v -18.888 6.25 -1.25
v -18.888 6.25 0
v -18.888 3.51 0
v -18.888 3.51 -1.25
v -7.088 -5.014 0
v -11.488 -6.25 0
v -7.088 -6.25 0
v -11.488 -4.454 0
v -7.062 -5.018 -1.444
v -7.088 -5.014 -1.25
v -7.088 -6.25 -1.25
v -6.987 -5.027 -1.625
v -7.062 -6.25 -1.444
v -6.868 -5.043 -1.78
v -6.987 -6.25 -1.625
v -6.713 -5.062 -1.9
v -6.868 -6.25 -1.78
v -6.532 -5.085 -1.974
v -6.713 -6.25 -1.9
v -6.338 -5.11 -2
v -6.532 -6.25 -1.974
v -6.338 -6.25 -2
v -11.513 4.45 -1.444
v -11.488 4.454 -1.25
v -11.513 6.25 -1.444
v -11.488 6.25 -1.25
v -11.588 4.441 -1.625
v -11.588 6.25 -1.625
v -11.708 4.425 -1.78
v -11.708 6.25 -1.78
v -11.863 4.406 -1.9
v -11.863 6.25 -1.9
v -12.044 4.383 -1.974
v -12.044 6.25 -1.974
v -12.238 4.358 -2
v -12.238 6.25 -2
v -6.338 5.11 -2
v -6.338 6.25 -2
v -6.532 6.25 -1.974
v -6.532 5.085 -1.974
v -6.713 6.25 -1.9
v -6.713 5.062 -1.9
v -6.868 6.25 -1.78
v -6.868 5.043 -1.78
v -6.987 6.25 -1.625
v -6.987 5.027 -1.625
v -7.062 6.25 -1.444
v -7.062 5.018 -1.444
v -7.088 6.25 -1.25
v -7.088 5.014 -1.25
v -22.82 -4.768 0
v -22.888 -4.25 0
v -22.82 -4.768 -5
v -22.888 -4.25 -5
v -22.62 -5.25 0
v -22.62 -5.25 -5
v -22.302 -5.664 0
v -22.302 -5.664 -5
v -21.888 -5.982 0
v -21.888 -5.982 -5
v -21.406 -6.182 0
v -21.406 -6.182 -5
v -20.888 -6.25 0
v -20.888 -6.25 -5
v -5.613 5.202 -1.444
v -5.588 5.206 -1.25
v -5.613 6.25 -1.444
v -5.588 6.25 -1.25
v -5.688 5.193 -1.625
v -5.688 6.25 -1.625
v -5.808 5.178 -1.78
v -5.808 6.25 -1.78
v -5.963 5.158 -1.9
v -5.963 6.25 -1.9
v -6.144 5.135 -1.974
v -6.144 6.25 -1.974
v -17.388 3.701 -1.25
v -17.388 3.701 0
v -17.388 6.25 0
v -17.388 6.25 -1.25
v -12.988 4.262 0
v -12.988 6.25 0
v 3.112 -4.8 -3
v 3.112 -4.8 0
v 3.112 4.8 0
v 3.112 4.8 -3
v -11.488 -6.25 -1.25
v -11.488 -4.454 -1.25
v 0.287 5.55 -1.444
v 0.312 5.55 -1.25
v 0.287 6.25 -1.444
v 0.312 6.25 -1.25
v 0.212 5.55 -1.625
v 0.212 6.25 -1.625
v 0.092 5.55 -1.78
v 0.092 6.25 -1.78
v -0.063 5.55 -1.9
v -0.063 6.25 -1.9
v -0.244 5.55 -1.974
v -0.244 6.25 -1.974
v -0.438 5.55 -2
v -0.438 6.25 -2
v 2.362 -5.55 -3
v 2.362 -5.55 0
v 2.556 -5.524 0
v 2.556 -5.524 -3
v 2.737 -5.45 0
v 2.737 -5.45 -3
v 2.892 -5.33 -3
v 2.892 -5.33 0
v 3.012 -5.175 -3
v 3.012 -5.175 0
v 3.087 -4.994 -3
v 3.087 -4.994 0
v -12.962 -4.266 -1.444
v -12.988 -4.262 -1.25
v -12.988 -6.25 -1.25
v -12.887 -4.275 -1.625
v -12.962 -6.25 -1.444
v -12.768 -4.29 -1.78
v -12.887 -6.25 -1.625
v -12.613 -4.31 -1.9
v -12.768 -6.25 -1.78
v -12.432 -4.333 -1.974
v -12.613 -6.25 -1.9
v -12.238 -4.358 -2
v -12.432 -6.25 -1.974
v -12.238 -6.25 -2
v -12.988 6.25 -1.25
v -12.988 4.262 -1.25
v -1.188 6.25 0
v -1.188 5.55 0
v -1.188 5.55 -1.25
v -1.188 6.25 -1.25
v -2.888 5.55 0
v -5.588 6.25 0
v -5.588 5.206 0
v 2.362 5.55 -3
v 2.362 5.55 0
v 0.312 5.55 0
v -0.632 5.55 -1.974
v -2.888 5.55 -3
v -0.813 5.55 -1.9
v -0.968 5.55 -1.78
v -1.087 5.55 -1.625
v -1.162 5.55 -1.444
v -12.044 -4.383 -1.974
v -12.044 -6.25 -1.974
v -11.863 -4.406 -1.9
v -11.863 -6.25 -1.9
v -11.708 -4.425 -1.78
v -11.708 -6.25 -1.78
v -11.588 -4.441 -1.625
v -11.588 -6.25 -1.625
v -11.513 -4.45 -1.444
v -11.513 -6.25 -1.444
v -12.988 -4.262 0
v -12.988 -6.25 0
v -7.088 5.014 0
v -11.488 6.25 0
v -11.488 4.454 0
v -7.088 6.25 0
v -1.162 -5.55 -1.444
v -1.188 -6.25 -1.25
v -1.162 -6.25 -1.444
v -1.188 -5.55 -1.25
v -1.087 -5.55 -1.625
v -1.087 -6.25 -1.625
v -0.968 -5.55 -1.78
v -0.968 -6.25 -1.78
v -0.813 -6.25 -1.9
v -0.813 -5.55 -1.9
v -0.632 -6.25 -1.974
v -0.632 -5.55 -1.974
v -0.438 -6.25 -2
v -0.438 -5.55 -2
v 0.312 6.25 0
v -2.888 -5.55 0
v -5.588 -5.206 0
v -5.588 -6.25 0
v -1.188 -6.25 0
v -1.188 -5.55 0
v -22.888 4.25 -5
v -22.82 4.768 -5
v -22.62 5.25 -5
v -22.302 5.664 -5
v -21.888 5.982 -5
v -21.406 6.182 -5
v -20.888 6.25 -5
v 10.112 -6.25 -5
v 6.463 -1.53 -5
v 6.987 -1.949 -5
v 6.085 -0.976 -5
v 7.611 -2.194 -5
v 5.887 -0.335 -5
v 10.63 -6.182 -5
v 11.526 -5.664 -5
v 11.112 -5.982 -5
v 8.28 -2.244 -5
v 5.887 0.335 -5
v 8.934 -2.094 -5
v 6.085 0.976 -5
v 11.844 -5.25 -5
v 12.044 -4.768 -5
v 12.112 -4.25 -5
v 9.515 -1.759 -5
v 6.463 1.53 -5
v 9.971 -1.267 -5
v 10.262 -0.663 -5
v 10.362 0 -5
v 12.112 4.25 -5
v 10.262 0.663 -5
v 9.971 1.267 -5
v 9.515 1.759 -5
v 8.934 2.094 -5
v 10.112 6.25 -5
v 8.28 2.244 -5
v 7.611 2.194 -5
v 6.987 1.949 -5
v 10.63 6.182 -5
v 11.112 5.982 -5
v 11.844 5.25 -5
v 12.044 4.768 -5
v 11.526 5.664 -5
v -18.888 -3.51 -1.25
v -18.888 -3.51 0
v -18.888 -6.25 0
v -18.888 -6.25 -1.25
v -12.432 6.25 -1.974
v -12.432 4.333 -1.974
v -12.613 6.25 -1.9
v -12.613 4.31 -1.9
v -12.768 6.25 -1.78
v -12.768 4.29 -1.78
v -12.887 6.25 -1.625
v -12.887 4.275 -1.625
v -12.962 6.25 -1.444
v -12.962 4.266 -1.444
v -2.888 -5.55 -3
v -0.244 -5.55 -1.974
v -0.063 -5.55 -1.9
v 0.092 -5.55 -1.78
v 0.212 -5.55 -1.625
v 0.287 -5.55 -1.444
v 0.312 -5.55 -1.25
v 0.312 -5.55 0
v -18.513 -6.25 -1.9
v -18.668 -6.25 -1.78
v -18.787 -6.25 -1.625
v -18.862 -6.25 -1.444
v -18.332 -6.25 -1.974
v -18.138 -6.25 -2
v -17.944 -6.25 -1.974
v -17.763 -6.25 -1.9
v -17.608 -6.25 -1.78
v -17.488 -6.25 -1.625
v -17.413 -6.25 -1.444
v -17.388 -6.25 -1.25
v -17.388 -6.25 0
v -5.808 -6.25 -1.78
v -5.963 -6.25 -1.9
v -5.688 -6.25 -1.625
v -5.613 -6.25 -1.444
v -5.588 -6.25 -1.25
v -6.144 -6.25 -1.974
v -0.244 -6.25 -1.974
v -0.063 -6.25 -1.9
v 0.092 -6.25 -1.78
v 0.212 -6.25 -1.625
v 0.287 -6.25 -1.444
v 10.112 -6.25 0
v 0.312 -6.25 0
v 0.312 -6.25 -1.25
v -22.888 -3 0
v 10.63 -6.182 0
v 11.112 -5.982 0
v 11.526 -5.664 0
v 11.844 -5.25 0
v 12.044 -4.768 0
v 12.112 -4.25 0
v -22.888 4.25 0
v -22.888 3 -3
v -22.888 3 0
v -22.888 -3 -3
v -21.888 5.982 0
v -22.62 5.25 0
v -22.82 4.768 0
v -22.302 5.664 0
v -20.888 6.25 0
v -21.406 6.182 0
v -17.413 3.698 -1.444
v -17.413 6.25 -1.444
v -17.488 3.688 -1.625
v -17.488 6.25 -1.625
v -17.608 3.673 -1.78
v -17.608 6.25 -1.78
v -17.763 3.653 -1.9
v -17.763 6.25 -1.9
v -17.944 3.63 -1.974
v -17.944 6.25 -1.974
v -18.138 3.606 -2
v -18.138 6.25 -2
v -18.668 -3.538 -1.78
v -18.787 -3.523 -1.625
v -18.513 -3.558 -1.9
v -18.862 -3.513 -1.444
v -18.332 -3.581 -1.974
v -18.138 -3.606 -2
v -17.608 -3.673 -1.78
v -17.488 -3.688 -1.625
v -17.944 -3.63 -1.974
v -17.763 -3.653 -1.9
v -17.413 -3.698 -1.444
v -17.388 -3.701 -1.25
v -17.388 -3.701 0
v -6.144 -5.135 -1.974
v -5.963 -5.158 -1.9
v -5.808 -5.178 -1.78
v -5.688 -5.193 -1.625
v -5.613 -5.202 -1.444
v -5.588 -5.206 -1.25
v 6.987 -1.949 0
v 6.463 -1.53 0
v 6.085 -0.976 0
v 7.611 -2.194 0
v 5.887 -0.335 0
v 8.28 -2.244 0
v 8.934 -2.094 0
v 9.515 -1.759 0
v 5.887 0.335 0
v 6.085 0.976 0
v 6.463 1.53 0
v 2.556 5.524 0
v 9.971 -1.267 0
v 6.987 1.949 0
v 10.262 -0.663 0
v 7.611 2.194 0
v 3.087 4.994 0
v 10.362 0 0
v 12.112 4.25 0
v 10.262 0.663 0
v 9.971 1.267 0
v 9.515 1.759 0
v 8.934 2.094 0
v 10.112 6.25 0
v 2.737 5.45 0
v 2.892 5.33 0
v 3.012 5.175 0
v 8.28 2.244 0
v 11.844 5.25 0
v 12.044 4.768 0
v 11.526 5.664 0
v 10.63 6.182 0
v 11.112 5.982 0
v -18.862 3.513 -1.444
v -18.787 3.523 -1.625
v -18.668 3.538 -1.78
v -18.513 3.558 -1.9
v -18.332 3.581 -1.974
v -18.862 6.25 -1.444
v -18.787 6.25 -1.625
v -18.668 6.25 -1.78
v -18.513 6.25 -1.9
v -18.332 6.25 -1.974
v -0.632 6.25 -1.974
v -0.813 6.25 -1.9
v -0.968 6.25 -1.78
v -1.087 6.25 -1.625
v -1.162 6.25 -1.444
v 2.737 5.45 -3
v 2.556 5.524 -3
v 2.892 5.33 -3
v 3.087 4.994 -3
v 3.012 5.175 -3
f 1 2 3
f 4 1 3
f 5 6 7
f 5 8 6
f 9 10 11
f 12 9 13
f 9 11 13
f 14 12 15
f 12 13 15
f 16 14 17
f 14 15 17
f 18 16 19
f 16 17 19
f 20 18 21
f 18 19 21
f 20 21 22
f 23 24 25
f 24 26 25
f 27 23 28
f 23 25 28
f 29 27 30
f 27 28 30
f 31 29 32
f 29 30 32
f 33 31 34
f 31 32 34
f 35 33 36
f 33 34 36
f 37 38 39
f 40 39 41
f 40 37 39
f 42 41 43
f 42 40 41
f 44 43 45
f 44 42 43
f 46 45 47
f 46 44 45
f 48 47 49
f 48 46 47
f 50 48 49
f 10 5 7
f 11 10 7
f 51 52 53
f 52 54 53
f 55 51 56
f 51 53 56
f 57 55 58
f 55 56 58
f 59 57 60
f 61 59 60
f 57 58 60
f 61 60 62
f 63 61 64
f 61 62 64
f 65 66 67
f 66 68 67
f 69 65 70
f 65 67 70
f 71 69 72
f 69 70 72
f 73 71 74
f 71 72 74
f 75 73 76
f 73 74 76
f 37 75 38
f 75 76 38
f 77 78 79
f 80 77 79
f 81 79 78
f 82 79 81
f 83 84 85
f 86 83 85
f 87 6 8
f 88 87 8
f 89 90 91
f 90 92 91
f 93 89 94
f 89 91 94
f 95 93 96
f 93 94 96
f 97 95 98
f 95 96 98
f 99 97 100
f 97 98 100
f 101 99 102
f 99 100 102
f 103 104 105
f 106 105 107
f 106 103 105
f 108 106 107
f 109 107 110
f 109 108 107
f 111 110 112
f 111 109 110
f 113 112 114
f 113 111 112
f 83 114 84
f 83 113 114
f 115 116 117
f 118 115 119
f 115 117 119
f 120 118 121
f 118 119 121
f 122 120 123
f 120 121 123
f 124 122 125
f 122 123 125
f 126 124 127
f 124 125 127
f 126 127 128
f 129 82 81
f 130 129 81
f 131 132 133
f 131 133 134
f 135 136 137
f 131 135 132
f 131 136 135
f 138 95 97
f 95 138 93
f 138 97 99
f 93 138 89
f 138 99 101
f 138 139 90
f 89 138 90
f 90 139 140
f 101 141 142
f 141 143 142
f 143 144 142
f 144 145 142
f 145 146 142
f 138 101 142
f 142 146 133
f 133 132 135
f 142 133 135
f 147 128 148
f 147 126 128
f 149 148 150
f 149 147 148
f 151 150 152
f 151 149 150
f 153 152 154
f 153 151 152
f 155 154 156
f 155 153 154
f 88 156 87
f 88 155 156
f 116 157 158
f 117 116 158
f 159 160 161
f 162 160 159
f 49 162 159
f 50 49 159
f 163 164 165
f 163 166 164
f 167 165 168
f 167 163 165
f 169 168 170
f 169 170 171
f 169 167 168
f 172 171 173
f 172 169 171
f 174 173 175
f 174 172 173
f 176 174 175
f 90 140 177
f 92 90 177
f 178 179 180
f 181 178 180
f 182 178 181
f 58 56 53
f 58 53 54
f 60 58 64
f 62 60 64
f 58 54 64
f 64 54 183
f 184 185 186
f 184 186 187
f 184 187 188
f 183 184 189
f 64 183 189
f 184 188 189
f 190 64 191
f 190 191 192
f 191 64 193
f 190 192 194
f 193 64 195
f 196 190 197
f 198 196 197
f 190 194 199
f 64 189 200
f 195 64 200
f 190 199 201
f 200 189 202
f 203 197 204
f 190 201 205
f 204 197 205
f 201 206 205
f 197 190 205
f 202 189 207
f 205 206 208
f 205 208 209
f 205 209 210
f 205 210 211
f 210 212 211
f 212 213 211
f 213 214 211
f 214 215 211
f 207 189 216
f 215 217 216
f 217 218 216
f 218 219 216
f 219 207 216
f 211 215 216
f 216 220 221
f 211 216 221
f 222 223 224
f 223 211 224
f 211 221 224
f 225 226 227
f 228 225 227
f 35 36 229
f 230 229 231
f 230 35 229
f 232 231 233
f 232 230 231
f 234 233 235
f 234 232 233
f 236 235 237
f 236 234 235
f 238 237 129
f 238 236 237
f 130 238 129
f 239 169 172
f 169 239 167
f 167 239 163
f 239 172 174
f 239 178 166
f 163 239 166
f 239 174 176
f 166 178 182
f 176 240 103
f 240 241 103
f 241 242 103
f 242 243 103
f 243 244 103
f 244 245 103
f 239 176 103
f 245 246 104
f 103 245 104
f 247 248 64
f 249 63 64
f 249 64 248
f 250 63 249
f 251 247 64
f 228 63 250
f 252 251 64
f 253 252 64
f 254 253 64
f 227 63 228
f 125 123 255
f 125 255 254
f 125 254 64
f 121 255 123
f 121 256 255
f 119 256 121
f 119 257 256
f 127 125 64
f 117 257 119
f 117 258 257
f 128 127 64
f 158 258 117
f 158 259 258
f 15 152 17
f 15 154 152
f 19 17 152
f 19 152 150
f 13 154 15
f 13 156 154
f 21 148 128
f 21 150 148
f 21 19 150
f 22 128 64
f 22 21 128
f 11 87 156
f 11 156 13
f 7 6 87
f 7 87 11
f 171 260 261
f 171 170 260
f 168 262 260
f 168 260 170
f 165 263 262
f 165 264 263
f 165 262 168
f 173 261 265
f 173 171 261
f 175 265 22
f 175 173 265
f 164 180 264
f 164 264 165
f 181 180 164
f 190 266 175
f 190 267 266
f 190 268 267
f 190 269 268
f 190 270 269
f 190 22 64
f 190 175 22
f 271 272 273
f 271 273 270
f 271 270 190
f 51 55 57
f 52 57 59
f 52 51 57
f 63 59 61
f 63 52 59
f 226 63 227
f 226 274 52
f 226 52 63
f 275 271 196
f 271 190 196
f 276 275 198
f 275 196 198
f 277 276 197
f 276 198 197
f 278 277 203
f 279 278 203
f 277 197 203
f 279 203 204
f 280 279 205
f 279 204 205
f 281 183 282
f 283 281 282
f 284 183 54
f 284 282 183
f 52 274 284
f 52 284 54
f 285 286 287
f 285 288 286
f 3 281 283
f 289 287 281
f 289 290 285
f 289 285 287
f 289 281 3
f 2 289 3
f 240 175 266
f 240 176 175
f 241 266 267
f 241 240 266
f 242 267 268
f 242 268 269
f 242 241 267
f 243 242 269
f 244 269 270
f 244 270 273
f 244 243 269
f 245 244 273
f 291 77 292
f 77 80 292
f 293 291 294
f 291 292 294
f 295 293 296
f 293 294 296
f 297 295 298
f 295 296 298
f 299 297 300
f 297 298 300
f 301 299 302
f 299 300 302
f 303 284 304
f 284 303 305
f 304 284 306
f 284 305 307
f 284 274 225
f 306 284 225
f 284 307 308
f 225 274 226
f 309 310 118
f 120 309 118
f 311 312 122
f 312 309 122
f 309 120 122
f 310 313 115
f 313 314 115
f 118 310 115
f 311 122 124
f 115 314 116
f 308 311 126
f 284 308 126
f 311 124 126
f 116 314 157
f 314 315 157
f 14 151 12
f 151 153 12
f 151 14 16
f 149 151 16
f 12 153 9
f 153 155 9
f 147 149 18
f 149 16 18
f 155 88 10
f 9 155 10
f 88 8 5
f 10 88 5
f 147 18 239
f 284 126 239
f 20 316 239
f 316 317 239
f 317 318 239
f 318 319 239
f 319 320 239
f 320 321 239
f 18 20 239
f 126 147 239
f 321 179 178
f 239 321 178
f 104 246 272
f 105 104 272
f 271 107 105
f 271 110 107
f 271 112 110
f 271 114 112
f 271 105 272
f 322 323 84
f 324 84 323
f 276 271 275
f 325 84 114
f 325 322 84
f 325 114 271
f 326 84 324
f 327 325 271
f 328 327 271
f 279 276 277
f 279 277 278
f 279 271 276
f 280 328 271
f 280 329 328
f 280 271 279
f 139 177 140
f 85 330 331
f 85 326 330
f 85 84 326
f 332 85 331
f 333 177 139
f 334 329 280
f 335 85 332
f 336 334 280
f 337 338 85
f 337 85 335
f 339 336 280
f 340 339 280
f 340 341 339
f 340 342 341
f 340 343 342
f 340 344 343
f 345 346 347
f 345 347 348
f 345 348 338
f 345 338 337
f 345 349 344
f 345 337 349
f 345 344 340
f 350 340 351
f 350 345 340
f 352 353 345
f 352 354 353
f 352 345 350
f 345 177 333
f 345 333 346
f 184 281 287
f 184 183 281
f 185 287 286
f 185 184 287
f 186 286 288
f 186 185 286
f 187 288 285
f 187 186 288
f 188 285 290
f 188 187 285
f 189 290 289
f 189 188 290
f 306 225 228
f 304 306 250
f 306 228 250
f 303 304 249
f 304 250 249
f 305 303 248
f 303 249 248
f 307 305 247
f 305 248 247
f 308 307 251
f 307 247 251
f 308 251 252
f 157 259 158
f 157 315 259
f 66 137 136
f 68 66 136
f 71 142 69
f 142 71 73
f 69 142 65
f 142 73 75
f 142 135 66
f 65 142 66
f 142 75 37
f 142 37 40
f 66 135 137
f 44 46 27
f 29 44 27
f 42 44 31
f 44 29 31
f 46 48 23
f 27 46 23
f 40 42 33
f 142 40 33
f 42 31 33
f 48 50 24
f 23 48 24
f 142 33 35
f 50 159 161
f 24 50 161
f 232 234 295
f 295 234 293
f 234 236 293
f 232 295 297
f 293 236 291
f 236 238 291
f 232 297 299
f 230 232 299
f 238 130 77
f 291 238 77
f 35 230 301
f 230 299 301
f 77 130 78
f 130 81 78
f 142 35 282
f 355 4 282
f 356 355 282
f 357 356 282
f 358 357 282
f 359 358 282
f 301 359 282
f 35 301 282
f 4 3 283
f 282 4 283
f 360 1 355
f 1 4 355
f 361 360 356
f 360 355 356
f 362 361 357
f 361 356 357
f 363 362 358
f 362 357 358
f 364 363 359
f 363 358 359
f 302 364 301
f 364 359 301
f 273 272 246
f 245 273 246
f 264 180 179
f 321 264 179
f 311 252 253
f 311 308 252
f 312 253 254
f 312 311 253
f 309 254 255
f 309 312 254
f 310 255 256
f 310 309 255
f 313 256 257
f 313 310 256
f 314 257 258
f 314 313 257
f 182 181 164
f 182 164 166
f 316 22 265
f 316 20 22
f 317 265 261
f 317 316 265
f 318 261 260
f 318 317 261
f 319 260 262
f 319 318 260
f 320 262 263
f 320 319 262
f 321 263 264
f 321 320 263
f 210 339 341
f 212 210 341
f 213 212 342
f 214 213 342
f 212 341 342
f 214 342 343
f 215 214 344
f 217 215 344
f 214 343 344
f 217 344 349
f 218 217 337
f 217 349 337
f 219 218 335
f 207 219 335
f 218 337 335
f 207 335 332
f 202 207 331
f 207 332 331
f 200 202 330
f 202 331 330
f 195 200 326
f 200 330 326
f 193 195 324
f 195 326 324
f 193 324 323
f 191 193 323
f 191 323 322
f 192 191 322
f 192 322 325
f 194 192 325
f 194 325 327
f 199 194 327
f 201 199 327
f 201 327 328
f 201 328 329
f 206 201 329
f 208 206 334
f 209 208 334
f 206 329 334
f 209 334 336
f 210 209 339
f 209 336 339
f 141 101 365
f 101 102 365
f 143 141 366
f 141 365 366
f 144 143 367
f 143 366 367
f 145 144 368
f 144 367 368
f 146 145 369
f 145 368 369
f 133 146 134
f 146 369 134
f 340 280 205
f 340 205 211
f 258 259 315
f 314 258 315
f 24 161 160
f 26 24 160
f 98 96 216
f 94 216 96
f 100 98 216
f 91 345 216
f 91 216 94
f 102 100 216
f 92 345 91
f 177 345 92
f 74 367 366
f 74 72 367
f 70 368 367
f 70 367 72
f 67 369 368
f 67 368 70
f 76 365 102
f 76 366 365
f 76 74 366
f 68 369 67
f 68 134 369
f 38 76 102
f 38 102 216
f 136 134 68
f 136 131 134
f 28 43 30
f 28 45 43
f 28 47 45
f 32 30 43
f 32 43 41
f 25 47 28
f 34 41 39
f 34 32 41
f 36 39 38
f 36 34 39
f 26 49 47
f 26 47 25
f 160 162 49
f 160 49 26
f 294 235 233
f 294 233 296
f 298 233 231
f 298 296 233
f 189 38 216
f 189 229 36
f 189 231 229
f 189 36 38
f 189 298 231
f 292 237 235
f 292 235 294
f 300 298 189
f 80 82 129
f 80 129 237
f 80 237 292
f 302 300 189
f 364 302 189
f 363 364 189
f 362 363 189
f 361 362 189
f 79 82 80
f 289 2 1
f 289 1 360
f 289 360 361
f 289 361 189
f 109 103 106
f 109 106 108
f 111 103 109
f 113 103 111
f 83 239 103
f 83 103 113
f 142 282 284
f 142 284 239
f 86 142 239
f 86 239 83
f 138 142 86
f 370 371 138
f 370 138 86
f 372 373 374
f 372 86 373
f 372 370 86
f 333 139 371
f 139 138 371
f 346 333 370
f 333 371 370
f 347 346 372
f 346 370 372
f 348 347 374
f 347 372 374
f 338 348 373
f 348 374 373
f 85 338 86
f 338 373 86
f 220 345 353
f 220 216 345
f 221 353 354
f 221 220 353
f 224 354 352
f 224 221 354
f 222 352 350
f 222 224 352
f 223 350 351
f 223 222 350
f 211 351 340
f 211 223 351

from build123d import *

# Parameters (mm, degrees)
F0_W     = 1.5
F0_H     = 0.7
F0_R     = 2.25
F0_H_2   = 11.1
F0_W_2   = 2.8
F1_DEPTH = 5
F2_DEPTH = 3
F3_DEPTH = 2
F4_R     = 0.74999
F5_R     = 2


# Not quite as in the source:
# - a fillet or chamfer is up to 0.001 mm smaller than in the source, because OpenCascade refuses the exact size


with BuildPart() as f1:
    # F0 (on Top) → F1 (new body)
    with BuildSketch(Plane.XY):
        Polygon((-18.8879279066, 6.25), (-22.8879279066, 6.25), (-22.8879279066, 3), (-18.8879279066, 3.51), align=None)
        Polygon((-17.3879279066, 6.25), (-18.8879279066, 6.25), (-18.8879279066, 3.51), (-17.3879279066, 3.70125), align=None)
        Polygon((-18.8879279066, 3.51), (-22.8879279066, 3), (-22.8879279066, -3), (-18.8879279066, -3.51), align=None)
        Polygon((-12.9879279066, 6.25), (-17.3879279066, 6.25), (-17.3879279066, 3.70125), (-12.9879279066, 4.26225), align=None)
        Polygon((-18.8879279066, -3.51), (-22.8879279066, -3), (-22.8879279066, -6.25), (-18.8879279066, -6.25), align=None)
        Polygon((-11.4879279066, 6.25), (-12.9879279066, 6.25), (-12.9879279066, 4.26225), (-11.4879279066, 4.4535), align=None)
        Polygon((-17.3879279066, -3.70125), (-18.8879279066, -3.51), (-18.8879279066, -6.25), (-17.3879279066, -6.25), align=None)
        Polygon((-7.0879279066, 6.25), (-11.4879279066, 6.25), (-11.4879279066, 4.4535), (-7.0879279066, 5.0145), align=None)
        Polygon((-12.9879279066, -4.26225), (-17.3879279066, -3.70125), (-17.3879279066, -6.25), (-12.9879279066, -6.25), align=None)
        Polygon((-5.5879279066, 6.25), (-7.0879279066, 6.25), (-7.0879279066, 5.0145), (-5.5879279066, 5.20575), align=None)
        Polygon((-11.4879279066, -4.4535), (-12.9879279066, -4.26225), (-12.9879279066, -6.25), (-11.4879279066, -6.25), align=None)
        Polygon((-1.1879279066, 6.25), (-5.5879279066, 6.25), (-5.5879279066, 5.20575), (-2.8879279066, 5.55), (-1.1879279066, 5.55), align=None)
        Polygon((-7.0879279066, -5.0145), (-11.4879279066, -4.4535), (-11.4879279066, -6.25), (-7.0879279066, -6.25), align=None)
        with Locations((-0.4379279066, 5.9)):
            Rectangle(F0_W, F0_H)
        Polygon((-5.5879279066, -5.20575), (-7.0879279066, -5.0145), (-7.0879279066, -6.25), (-5.5879279066, -6.25), align=None)
        Polygon((12.1120720934, 6.25), (0.3120720934, 6.25), (0.3120720934, 5.55), (3.1120720934, 5.55), (3.1120720934, -5.55), (0.3120720934, -5.55), (0.3120720934, -6.25), (12.1120720934, -6.25), align=None)
        with Locations((8.1120720934, 0)):
            Circle(F0_R, mode=Mode.SUBTRACT)
        Polygon((-2.8879279066, -5.55), (-5.5879279066, -5.20575), (-5.5879279066, -6.25), (-1.1879279066, -6.25), (-1.1879279066, -5.55), align=None)
        with Locations((-0.4379279066, -5.9)):
            Rectangle(F0_W, F0_H)
        with Locations((-0.4379279066, 0)):
            Rectangle(F0_W, F0_H_2)
        Polygon((-5.5879279066, 5.20575), (-7.0879279066, 5.0145), (-7.0879279066, -5.0145), (-5.5879279066, -5.20575), align=None)
        Polygon((-17.3879279066, 3.70125), (-18.8879279066, 3.51), (-18.8879279066, -3.51), (-17.3879279066, -3.70125), align=None)
        Polygon((-12.9879279066, 4.26225), (-17.3879279066, 3.70125), (-17.3879279066, -3.70125), (-12.9879279066, -4.26225), align=None)
        Polygon((-7.0879279066, 5.0145), (-11.4879279066, 4.4535), (-11.4879279066, -4.4535), (-7.0879279066, -5.0145), align=None)
        Polygon((-11.4879279066, 4.4535), (-12.9879279066, 4.26225), (-12.9879279066, -4.26225), (-11.4879279066, -4.4535), align=None)
        Polygon((-2.8879279066, 5.55), (-5.5879279066, 5.20575), (-5.5879279066, -5.20575), (-2.8879279066, -5.55), (-1.1879279066, -5.55), (-1.1879279066, 5.55), align=None)
        with Locations((1.7120720934, 0)):
            Rectangle(F0_W_2, F0_H_2)
    extrude(amount=-F1_DEPTH)

    # F0 (on Top) → F2 (cut)
    with BuildSketch(Plane.XY):
        Polygon((-18.8879279066, 3.51), (-22.8879279066, 3), (-22.8879279066, -3), (-18.8879279066, -3.51), align=None)
        Polygon((-17.3879279066, 3.70125), (-18.8879279066, 3.51), (-18.8879279066, -3.51), (-17.3879279066, -3.70125), align=None)
        Polygon((-12.9879279066, 4.26225), (-17.3879279066, 3.70125), (-17.3879279066, -3.70125), (-12.9879279066, -4.26225), align=None)
        Polygon((-11.4879279066, 4.4535), (-12.9879279066, 4.26225), (-12.9879279066, -4.26225), (-11.4879279066, -4.4535), align=None)
        Polygon((-7.0879279066, 5.0145), (-11.4879279066, 4.4535), (-11.4879279066, -4.4535), (-7.0879279066, -5.0145), align=None)
        Polygon((-5.5879279066, 5.20575), (-7.0879279066, 5.0145), (-7.0879279066, -5.0145), (-5.5879279066, -5.20575), align=None)
        Polygon((-2.8879279066, 5.55), (-5.5879279066, 5.20575), (-5.5879279066, -5.20575), (-2.8879279066, -5.55), (-1.1879279066, -5.55), (-1.1879279066, 5.55), align=None)
        with Locations((-0.4379279066, 0)):
            Rectangle(F0_W, F0_H_2)
        with Locations((1.7120720934, 0)):
            Rectangle(F0_W_2, F0_H_2)
    extrude(amount=-F2_DEPTH, mode=Mode.SUBTRACT)

    # F0 (on Top) → F3 (cut)
    with BuildSketch(Plane.XY):
        Polygon((-17.3879279066, 6.25), (-18.8879279066, 6.25), (-18.8879279066, 3.51), (-17.3879279066, 3.70125), align=None)
        Polygon((-11.4879279066, 6.25), (-12.9879279066, 6.25), (-12.9879279066, 4.26225), (-11.4879279066, 4.4535), align=None)
        Polygon((-5.5879279066, 6.25), (-7.0879279066, 6.25), (-7.0879279066, 5.0145), (-5.5879279066, 5.20575), align=None)
        with Locations((-0.4379279066, -5.9)):
            Rectangle(F0_W, F0_H)
        Polygon((-17.3879279066, -3.70125), (-18.8879279066, -3.51), (-18.8879279066, -6.25), (-17.3879279066, -6.25), align=None)
        Polygon((-11.4879279066, -4.4535), (-12.9879279066, -4.26225), (-12.9879279066, -6.25), (-11.4879279066, -6.25), align=None)
        Polygon((-5.5879279066, -5.20575), (-7.0879279066, -5.0145), (-7.0879279066, -6.25), (-5.5879279066, -6.25), align=None)
        with Locations((-0.4379279066, 5.9)):
            Rectangle(F0_W, F0_H)
    extrude(amount=-F3_DEPTH, mode=Mode.SUBTRACT)

    # F4 (radius 0.75 in the source; OpenCascade refuses exactly that, so slightly less here)
    f4_edges = [f1.edges().sort_by_distance(p)[0] for p in [
        (-17.387928, -4.975625, -2),
        (-11.487928, -5.35175, -2),
        (-5.587928, -5.727875, -2),
        (0.312072, -5.9, -2),
        (-18.887928, -4.88, -2),
        (-12.987928, -5.256125, -2),
        (-7.087928, -5.63225, -2),
        (-1.187928, -5.9, -2),
        (-18.887928, 4.88, -2),
        (-12.987928, 5.256125, -2),
        (-7.087928, 5.63225, -2),
        (-1.187928, 5.9, -2),
        (-17.387928, 4.975625, -2),
        (-11.487928, 5.35175, -2),
        (-5.587928, 5.727875, -2),
        (0.312072, 5.9, -2),
        (3.112072, 5.55, -1.5),
        (3.112072, -5.55, -1.5),
    ]]
    fillet(f4_edges, radius=F4_R)

    # F5
    f5_edges = [f1.edges().sort_by_distance(p)[0] for p in [
        (-22.887928, -6.25, -2.5),
        (-22.887928, 6.25, -2.5),
        (12.112072, -6.25, -2.5),
        (12.112072, 6.25, -2.5),
    ]]
    fillet(f5_edges, radius=F5_R)


solid = f1.part
